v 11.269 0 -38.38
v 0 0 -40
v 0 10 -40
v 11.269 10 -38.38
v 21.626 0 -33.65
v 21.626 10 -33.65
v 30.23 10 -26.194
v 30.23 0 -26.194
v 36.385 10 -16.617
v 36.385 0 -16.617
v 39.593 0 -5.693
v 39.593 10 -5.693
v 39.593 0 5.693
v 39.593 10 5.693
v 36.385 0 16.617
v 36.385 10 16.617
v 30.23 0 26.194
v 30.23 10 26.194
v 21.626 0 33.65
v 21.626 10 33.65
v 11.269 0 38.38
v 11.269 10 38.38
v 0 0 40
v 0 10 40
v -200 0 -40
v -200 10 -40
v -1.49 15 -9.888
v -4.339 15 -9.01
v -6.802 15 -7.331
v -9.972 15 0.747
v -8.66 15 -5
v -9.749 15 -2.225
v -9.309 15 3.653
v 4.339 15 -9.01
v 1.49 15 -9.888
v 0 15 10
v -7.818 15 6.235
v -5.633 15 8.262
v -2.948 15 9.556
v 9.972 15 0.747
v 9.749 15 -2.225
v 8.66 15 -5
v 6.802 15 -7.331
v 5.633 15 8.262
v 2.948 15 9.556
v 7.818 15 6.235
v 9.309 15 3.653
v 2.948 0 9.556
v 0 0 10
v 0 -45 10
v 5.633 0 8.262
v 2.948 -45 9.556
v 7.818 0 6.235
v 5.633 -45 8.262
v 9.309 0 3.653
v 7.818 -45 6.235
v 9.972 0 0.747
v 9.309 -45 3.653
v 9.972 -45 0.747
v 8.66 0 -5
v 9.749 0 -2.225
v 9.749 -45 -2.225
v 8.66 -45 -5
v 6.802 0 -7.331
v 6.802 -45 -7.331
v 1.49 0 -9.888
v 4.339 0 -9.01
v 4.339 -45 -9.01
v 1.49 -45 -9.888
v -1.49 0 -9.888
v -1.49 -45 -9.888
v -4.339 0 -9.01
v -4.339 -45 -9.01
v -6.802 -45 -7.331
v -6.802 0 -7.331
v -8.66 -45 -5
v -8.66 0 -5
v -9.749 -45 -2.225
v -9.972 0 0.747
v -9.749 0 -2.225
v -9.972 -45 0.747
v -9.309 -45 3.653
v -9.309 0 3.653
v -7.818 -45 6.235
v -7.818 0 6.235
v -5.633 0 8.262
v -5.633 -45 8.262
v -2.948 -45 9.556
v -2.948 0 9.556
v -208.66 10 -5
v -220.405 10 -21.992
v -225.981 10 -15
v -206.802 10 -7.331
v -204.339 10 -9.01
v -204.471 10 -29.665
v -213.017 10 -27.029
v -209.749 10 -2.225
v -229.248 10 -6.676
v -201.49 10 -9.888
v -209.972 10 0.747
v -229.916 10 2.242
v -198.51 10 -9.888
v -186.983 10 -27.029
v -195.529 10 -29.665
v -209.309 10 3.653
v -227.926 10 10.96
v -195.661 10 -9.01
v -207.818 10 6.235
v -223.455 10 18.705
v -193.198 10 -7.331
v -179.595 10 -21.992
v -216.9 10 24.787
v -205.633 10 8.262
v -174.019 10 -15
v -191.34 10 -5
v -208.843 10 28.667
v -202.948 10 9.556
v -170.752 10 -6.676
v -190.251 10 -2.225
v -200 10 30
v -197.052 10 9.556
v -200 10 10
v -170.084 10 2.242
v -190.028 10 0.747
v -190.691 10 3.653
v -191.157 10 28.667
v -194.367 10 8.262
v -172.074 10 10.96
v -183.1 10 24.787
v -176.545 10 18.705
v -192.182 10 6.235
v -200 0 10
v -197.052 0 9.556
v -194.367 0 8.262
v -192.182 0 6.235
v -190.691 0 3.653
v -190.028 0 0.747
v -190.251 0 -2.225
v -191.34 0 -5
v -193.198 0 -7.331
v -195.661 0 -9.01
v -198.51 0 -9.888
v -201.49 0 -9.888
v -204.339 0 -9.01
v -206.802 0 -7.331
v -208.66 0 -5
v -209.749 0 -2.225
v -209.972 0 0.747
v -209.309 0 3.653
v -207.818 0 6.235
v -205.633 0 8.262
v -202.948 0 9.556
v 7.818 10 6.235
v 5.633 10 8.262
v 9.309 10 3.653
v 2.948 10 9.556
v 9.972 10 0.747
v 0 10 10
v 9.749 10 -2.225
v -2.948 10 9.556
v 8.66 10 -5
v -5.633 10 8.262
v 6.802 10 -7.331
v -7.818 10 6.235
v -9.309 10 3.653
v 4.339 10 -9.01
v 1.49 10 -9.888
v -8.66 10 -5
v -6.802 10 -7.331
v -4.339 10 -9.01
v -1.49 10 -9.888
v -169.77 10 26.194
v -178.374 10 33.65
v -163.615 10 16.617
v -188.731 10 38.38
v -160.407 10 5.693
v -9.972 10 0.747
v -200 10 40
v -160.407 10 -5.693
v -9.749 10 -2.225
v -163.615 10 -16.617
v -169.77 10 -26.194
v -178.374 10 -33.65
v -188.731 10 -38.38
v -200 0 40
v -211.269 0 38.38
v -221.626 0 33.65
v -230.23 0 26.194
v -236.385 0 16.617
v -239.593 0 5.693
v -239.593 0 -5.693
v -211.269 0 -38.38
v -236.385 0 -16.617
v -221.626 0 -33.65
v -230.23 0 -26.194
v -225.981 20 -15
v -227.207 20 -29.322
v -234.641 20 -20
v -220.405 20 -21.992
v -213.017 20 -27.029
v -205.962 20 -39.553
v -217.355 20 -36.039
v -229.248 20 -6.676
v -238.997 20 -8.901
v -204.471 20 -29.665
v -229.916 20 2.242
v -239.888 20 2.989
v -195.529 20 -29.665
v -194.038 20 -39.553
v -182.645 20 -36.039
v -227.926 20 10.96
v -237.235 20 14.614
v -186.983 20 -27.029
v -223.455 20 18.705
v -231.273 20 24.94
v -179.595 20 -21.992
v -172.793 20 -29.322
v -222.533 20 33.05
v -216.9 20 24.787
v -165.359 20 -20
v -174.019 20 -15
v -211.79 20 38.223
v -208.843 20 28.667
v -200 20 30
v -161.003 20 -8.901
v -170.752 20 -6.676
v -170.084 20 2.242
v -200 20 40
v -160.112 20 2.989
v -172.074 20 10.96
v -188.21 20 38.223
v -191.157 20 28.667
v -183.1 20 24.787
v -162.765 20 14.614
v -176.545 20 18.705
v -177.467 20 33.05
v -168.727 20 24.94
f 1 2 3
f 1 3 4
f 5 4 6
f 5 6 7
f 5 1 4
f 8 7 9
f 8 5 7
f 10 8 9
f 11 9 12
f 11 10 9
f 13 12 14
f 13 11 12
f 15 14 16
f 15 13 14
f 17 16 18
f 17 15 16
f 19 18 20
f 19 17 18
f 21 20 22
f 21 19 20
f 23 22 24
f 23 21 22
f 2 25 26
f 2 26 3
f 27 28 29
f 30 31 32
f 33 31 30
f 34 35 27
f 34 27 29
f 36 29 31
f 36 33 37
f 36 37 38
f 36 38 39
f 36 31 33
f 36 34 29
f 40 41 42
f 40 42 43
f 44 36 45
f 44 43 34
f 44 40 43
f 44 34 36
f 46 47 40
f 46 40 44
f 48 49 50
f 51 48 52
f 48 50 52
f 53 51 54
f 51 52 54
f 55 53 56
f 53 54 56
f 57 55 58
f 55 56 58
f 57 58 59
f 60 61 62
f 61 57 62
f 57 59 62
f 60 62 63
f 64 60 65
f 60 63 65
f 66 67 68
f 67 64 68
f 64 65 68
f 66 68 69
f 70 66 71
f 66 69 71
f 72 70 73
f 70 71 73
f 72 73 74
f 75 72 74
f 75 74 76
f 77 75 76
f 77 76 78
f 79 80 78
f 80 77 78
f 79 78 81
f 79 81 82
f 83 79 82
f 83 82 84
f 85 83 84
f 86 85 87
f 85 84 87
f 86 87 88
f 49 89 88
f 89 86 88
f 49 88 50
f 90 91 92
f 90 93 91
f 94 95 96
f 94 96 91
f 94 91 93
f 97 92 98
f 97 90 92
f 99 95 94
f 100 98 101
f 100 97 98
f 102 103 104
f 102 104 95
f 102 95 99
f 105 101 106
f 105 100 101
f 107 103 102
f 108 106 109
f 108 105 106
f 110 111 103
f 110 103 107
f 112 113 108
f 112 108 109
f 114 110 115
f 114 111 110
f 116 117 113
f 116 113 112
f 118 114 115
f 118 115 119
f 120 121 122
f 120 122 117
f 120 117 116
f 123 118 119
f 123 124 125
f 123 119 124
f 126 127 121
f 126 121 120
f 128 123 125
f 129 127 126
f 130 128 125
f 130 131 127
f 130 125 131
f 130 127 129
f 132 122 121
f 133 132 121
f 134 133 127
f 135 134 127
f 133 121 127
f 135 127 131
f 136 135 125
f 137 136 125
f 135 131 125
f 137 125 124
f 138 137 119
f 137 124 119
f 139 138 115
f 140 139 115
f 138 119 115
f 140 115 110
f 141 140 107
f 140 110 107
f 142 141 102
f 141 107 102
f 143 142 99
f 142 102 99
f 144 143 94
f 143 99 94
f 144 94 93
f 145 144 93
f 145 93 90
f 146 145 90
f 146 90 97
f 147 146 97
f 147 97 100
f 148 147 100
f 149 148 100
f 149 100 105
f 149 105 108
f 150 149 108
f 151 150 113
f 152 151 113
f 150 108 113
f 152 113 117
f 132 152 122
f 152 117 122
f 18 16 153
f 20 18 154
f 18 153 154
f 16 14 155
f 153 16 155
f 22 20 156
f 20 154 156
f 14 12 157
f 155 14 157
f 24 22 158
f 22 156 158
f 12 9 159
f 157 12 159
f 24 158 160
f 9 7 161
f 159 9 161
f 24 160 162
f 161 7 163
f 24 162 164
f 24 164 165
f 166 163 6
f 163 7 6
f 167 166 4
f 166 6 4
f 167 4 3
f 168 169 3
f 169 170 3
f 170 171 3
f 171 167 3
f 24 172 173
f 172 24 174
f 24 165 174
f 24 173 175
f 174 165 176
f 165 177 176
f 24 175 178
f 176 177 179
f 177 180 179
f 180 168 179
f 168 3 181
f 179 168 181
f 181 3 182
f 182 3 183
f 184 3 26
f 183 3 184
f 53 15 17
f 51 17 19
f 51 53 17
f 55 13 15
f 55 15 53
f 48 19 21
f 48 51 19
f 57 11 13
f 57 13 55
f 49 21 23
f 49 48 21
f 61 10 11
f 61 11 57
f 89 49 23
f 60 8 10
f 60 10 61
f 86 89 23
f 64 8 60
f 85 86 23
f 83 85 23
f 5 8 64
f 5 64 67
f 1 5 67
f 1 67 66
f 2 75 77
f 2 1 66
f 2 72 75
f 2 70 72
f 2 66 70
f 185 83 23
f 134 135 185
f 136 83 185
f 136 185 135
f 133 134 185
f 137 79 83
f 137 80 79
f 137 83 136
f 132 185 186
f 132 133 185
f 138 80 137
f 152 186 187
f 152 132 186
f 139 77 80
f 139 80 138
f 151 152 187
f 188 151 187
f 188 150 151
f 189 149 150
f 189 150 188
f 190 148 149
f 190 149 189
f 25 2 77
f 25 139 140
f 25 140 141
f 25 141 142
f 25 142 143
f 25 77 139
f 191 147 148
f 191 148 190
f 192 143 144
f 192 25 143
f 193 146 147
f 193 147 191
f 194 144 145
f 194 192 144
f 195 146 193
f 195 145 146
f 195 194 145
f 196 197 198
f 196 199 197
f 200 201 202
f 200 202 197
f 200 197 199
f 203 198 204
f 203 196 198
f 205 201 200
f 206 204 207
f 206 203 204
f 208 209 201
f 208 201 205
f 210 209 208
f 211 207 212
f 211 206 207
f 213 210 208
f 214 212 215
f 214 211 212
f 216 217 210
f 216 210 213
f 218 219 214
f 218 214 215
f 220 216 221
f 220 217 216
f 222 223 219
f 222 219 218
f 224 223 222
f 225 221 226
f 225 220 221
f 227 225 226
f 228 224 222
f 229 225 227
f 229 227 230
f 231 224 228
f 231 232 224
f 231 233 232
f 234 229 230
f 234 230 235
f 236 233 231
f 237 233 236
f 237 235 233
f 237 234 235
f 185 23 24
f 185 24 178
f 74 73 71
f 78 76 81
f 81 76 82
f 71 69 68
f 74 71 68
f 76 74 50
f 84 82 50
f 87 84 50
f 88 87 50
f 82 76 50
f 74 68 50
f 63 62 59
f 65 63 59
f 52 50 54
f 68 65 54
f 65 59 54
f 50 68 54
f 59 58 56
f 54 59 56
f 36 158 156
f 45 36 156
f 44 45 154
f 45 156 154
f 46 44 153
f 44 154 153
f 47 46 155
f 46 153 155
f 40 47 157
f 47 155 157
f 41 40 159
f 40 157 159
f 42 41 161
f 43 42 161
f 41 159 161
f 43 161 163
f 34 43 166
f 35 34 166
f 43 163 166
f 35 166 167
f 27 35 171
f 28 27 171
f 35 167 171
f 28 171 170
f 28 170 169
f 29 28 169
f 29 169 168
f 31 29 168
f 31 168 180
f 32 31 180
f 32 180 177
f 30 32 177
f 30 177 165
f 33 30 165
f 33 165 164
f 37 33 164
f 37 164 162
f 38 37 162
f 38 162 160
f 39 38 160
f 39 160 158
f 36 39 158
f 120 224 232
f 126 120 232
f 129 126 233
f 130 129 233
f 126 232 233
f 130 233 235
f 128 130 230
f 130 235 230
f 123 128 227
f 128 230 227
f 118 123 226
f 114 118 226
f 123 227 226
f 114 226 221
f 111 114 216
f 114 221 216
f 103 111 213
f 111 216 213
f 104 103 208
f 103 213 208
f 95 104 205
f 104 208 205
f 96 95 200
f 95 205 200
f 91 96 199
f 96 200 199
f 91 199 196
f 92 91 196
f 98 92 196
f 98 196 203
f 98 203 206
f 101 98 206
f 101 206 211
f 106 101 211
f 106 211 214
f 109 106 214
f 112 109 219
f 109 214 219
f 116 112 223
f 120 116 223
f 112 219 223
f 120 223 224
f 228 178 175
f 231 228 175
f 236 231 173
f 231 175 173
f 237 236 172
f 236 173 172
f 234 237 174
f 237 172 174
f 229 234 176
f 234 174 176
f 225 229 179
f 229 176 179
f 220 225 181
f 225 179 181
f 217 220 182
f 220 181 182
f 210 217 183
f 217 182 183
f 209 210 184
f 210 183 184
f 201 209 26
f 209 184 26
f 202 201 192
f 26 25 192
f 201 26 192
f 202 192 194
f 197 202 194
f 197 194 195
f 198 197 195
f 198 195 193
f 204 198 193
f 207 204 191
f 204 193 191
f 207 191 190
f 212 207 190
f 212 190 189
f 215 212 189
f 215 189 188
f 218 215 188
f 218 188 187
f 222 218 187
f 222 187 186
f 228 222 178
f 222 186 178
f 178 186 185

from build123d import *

# Parameters (mm, degrees)
BOSS_EXTRUDE1_DEPTH      = 10
SKETCH2_R                = 40
BOSS_EXTRUDE2_DEPTH      = 10
SKETCH3_R                = 30
CUT_EXTRUDE1_DEPTH       = 10
SKETCH4_R                = 10
CUT_EXTRUDE2_DEPTH       = 10
BOSS_EXTRUDE4_DEPTH      = 5
BOSS_EXTRUDE4_DEPTH_BACK = 55
SKETCH5_R                = 10


with BuildPart() as part:
    # Sketch1 → Boss-Extrude1 (new body)
    with BuildSketch(Plane(origin=(0, 0, 0), x_dir=(1, 0, 0), z_dir=(0, 1, 0))):
        with BuildLine():
            Line((-200, 40), (0, 40))
            ThreePointArc((0, 40), (40, 0), (0, -40))
            Line((0, -40), (-200, -40))
            ThreePointArc((-200, -40), (-240, 0), (-200, 40))
        make_face()
    extrude(amount=BOSS_EXTRUDE1_DEPTH)

    # Sketch2 → Boss-Extrude2 (add)
    with BuildSketch(Plane(origin=(0, 10, 0), x_dir=(1, 0, 0), z_dir=(0, 1, 0))):
        with Locations(Location((-200, 0, 0), (0, 0, 270))):
            Circle(SKETCH2_R)
    extrude(amount=BOSS_EXTRUDE2_DEPTH)

    # Sketch3 → Cut-Extrude1 (cut)
    with BuildSketch(Plane(origin=(0, 20, 0), x_dir=(1, 0, 0), z_dir=(0, 1, 0))):
        with Locations(Location((-200, 0, 0), (0, 0, 270))):
            Circle(SKETCH3_R)
    extrude(amount=-CUT_EXTRUDE1_DEPTH, mode=Mode.SUBTRACT)

    # Sketch4 → Cut-Extrude2 (cut)
    with BuildSketch(Plane(origin=(0, 10, 0), x_dir=(1, 0, 0), z_dir=(0, 1, 0))):
        with Locations(Location((-200, 0, 0), (0, 0, 270))):
            Circle(SKETCH4_R)
    extrude(amount=-CUT_EXTRUDE2_DEPTH, mode=Mode.SUBTRACT)

    # Sketch5 → Boss-Extrude4 (add, two sides: drawn at the far end of the back side and taken through both)
    with BuildSketch(Plane(origin=(0, 10, 0), x_dir=(1, 0, 0), z_dir=(0, 1, 0)).offset(-BOSS_EXTRUDE4_DEPTH_BACK)):
        with Locations(Location((0, 0, 0), (0, 0, 270))):
            Circle(SKETCH5_R)
    extrude(amount=BOSS_EXTRUDE4_DEPTH + BOSS_EXTRUDE4_DEPTH_BACK)


solid = part.part
